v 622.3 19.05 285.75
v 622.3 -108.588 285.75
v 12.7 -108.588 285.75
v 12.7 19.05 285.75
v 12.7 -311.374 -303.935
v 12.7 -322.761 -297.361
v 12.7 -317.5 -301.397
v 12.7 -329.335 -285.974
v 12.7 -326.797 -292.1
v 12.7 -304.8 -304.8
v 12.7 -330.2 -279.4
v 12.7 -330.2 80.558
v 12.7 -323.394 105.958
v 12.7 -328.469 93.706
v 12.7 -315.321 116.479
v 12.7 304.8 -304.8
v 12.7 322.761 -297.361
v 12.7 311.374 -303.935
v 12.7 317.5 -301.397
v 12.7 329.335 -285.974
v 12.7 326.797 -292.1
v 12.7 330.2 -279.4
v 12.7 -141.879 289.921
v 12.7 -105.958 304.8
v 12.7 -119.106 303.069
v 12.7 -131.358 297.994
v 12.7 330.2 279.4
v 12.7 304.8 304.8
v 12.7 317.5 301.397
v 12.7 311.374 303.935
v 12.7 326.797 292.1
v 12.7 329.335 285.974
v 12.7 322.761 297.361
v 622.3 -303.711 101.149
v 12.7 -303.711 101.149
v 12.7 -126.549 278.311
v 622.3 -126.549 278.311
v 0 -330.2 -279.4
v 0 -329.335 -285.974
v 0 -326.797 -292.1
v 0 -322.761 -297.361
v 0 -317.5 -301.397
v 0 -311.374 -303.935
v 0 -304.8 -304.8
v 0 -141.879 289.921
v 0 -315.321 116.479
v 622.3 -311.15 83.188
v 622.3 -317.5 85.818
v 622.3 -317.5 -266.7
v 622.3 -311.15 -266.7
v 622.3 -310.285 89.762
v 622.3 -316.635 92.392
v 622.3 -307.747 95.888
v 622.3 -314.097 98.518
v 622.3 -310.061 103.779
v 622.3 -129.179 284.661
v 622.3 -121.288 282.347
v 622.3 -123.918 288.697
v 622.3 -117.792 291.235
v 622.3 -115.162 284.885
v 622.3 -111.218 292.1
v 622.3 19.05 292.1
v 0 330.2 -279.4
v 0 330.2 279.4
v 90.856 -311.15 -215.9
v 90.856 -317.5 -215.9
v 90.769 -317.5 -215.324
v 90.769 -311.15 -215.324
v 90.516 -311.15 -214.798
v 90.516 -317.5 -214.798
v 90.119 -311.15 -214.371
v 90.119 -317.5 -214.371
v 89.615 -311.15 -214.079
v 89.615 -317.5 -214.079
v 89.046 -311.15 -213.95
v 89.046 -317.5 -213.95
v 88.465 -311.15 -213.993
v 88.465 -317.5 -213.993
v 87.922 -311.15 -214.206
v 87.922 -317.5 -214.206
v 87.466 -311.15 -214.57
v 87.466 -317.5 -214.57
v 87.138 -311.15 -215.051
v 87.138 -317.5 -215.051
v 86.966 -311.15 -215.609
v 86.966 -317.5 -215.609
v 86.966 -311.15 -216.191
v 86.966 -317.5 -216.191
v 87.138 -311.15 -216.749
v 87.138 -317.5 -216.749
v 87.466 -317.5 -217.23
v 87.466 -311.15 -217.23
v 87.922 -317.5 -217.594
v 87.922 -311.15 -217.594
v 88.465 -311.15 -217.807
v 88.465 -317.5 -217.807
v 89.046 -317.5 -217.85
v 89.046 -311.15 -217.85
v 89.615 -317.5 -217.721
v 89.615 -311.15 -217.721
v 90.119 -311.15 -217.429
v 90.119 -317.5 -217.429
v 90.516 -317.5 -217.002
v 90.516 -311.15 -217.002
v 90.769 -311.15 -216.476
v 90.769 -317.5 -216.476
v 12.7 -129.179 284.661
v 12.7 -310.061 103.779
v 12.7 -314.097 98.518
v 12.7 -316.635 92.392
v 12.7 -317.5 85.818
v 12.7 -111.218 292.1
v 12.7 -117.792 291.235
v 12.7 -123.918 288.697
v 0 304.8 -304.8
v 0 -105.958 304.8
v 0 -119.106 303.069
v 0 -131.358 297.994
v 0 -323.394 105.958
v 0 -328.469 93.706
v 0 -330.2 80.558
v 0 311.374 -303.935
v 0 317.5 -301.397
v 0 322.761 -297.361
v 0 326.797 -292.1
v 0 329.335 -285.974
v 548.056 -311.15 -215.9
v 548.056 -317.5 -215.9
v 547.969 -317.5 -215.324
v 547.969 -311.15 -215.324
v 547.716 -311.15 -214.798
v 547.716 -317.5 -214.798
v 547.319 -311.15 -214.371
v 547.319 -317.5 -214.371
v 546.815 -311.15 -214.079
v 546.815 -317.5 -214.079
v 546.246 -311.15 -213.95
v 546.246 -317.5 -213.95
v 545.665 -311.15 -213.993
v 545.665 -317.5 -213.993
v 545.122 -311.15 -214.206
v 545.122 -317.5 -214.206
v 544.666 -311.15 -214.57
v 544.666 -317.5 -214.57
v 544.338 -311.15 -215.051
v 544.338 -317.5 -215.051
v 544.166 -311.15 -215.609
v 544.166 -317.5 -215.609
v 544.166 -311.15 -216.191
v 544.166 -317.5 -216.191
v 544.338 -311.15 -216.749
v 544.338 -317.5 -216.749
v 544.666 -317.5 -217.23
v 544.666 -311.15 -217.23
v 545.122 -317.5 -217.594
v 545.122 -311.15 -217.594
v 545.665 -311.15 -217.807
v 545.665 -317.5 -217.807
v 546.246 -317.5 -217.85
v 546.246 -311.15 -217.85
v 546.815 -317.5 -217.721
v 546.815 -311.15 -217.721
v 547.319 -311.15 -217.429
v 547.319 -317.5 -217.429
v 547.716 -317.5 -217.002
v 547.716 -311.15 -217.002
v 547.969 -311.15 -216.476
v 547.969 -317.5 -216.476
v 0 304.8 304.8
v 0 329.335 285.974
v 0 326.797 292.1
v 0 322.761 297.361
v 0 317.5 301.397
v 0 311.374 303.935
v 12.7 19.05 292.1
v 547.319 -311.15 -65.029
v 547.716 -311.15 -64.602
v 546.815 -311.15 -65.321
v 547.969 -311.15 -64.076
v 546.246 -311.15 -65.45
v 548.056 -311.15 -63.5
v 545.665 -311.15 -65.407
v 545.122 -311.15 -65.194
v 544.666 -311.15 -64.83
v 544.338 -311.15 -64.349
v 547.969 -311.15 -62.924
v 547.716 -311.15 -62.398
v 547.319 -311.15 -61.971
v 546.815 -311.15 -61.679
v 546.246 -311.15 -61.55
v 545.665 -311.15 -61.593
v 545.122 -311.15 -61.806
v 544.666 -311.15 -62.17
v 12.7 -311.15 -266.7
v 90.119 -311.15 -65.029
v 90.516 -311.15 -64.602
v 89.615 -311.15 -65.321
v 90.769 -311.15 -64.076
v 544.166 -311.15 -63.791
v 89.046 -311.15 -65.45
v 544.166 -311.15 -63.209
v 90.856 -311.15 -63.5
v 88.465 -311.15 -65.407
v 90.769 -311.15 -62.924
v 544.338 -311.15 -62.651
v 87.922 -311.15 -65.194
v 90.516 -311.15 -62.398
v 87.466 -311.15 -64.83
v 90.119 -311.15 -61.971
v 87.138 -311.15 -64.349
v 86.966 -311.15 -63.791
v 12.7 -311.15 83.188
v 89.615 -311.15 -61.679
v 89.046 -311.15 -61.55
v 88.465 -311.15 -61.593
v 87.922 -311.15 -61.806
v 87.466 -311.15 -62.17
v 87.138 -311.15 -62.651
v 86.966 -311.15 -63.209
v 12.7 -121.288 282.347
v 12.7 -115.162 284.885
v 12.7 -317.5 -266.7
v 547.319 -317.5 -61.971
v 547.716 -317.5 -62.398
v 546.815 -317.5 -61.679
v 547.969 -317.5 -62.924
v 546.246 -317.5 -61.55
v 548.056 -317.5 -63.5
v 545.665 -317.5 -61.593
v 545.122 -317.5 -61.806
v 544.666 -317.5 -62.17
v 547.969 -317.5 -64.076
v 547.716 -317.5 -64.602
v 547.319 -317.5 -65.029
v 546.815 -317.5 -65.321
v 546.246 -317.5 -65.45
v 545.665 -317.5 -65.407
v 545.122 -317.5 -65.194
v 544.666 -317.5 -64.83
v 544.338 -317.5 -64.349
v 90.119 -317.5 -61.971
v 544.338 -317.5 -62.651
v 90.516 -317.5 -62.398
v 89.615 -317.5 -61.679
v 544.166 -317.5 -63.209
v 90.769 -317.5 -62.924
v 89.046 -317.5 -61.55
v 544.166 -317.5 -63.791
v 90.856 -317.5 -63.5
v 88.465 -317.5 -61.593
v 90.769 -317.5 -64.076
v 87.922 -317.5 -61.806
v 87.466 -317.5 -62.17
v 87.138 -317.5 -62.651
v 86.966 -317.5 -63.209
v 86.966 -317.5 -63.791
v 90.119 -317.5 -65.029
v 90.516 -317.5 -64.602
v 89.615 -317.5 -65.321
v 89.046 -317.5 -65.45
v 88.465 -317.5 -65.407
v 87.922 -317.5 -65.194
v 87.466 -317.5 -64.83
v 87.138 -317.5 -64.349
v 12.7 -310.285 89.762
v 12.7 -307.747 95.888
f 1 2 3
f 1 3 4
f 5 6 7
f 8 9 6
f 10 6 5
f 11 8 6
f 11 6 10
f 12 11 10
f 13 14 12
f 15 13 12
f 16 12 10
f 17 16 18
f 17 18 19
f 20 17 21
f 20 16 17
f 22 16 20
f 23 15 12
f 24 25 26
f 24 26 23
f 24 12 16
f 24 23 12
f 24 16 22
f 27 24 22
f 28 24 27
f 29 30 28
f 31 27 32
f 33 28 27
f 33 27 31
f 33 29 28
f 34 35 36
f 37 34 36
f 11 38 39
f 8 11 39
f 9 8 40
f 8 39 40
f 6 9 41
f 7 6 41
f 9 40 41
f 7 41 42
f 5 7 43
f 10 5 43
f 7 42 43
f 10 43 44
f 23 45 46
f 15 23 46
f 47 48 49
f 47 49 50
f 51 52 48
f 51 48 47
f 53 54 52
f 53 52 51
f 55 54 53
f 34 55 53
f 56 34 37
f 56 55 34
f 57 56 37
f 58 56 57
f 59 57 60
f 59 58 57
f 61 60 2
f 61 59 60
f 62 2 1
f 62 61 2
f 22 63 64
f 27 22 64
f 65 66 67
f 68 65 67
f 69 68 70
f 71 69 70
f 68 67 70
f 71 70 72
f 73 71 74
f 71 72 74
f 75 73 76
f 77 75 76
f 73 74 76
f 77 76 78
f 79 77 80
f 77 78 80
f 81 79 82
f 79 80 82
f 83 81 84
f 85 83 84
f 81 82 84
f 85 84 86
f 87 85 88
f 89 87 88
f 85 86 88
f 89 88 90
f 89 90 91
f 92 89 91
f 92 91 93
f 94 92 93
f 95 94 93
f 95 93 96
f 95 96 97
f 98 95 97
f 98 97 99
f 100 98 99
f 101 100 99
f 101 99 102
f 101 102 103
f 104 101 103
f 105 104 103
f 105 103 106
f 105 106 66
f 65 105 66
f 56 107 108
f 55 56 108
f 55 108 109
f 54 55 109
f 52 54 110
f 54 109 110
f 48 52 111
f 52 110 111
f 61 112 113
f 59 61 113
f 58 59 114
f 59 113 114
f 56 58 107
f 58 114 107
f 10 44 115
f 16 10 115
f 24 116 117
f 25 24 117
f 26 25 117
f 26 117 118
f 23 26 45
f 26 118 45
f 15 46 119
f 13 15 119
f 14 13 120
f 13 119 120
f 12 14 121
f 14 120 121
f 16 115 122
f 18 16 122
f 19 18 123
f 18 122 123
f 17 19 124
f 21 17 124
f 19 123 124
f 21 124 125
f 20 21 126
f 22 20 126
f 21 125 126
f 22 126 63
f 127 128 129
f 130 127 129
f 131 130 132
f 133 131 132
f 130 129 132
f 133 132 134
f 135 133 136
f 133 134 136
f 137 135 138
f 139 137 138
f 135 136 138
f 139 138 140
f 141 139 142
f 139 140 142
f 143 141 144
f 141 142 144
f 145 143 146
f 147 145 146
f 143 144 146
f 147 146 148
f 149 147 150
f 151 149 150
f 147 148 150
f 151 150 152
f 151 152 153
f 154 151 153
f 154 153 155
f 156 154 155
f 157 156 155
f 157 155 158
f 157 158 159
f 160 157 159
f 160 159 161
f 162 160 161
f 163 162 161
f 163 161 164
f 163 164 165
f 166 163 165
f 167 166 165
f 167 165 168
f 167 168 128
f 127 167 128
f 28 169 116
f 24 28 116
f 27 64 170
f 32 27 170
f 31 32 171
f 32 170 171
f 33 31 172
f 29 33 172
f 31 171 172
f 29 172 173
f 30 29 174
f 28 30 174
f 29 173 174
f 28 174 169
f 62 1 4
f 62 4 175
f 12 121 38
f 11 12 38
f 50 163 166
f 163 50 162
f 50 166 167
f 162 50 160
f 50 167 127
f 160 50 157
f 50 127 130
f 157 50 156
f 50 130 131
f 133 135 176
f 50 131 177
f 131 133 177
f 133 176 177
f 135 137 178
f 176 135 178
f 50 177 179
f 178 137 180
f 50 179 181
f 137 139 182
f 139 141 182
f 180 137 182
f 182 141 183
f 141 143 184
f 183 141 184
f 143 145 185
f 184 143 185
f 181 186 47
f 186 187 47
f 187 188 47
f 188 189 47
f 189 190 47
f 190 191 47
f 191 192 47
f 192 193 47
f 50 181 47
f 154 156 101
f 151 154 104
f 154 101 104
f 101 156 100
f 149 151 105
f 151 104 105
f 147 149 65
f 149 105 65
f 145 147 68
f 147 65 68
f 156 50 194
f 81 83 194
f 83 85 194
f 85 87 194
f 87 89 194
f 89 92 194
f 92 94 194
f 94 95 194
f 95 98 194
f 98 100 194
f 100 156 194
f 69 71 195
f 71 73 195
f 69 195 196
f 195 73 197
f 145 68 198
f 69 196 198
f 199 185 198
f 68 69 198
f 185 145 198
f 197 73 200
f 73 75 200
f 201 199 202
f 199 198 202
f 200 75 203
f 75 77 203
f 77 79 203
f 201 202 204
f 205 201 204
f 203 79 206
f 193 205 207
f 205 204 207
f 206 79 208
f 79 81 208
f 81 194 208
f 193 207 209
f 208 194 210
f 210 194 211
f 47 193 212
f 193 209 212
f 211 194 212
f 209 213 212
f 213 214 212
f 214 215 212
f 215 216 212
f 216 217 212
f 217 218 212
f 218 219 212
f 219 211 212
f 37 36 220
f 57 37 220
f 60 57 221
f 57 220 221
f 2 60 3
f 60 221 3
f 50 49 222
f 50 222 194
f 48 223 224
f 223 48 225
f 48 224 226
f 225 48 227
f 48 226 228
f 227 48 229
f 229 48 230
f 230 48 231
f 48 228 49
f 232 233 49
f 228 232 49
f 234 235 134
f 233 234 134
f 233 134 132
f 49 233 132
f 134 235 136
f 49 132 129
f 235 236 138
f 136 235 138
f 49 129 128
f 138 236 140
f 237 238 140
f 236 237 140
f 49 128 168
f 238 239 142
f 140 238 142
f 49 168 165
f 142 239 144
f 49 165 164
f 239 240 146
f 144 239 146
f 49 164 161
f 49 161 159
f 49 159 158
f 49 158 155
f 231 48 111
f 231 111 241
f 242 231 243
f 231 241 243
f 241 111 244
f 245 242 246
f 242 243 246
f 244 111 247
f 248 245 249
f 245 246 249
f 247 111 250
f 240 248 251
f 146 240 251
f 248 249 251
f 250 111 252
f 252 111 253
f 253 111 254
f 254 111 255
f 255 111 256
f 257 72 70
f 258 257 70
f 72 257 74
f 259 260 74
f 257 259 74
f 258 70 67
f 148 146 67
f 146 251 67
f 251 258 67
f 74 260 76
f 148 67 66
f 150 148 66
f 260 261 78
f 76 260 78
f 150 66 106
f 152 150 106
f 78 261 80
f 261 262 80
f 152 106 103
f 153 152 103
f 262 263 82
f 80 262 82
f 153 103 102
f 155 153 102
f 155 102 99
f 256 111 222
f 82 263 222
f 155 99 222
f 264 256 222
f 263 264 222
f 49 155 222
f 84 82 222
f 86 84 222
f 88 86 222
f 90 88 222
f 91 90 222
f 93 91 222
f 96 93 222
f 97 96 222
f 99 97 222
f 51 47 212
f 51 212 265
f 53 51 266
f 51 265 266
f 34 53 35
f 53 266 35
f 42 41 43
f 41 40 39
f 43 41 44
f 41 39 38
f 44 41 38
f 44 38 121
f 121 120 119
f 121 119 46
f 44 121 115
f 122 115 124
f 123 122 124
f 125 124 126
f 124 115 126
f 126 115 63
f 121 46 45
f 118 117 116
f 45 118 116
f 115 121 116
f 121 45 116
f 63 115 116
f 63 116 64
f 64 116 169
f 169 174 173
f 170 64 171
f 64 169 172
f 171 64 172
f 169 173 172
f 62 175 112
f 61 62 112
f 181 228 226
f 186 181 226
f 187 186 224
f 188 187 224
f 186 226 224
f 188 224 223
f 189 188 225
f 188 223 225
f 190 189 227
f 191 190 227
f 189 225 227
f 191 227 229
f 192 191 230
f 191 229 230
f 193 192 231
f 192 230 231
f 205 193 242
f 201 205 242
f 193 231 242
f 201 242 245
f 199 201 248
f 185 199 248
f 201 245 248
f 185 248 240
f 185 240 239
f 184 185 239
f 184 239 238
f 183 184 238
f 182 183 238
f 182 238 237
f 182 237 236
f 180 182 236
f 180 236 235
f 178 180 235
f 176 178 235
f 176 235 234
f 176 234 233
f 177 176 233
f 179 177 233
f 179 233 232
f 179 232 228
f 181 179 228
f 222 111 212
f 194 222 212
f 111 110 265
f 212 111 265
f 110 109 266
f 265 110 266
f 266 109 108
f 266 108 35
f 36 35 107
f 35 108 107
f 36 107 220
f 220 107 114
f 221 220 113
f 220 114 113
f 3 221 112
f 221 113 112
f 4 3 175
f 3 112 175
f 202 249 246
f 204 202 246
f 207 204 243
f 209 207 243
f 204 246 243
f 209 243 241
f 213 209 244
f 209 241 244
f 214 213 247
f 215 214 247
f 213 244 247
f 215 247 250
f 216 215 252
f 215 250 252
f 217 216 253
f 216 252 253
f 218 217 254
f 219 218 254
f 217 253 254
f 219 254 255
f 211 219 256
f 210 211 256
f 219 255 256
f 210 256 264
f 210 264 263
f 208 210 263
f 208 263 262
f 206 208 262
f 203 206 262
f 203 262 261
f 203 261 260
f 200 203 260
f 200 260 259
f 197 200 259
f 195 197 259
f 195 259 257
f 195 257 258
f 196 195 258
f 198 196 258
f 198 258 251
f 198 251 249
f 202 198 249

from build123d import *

# Parameters (mm, degrees)
F1_DEPTH = 12.7
F3_DEPTH = 609.6
F4_R     = 1.9558
F5_DEPTH = 647.701


with BuildPart() as f1:
    # F0 (on Right) → F1 (new body)
    with BuildSketch(Plane.YZ):
        with BuildLine():
            ThreePointArc((330.2, 279.4), (322.760512, 297.360512), (304.8, 304.8))
            Line((304.8, 304.8), (-105.957951, 304.8))
            ThreePointArc((-105.957951, 304.8), (-125.398269, 300.93308), (-141.878976, 289.921024))
            Line((-141.878976, 289.921024), (-315.321024, 116.478976))
            ThreePointArc((-315.321024, 116.478976), (-326.33308, 99.998269), (-330.2, 80.557951))
            Line((-330.2, 80.557951), (-330.2, -279.4))
            ThreePointArc((-330.2, -279.4), (-322.760512, -297.360512), (-304.8, -304.8))
            Line((-304.8, -304.8), (304.8, -304.8))
            ThreePointArc((304.8, -304.8), (322.760512, -297.360512), (330.2, -279.4))
            Line((330.2, -279.4), (330.2, 279.4))
        make_face()
    extrude(amount=F1_DEPTH)


with BuildPart() as f3:
    # F2 (on face) → F3 (new body)
    with BuildSketch(Plane.YZ.offset(12.7)):
        with BuildLine():
            ThreePointArc((-310.060512, 103.778976), (-315.56654, 95.538622), (-317.5, 85.818463))
            Line((-317.5, 85.818463), (-317.5, -266.7))
            Line((-317.5, -266.7), (-311.15, -266.7))
            Line((-311.15, -266.7), (-311.15, 83.188207))
            ThreePointArc((-311.15, 83.188207), (-309.21654, 92.908366), (-303.710512, 101.148719))
            Line((-303.710512, 101.148719), (-126.548719, 278.310512))
            ThreePointArc((-126.548719, 278.310512), (-118.308366, 283.81654), (-108.588207, 285.75))
            Line((-108.588207, 285.75), (19.05, 285.75))
            Line((19.05, 285.75), (19.05, 292.1))
            Line((19.05, 292.1), (-111.218463, 292.1))
            ThreePointArc((-111.218463, 292.1), (-120.938622, 290.16654), (-129.178976, 284.660512))
            Line((-129.178976, 284.660512), (-310.060512, 103.778976))
        make_face()
    extrude(amount=F3_DEPTH)

    # F4 (on face) → F5 (cut, through all)
    with BuildSketch(Plane.XZ.offset(317.5)):
        with Locations((546.1, -215.9)):
            Circle(F4_R)
        with Locations((546.1, -63.5)):
            Circle(F4_R)
        with Locations((88.9, -63.5)):
            Circle(F4_R)
        with Locations((88.9, -215.9)):
            Circle(F4_R)
    extrude(amount=-F5_DEPTH, mode=Mode.SUBTRACT)


solid = Compound([f1.part, f3.part])
